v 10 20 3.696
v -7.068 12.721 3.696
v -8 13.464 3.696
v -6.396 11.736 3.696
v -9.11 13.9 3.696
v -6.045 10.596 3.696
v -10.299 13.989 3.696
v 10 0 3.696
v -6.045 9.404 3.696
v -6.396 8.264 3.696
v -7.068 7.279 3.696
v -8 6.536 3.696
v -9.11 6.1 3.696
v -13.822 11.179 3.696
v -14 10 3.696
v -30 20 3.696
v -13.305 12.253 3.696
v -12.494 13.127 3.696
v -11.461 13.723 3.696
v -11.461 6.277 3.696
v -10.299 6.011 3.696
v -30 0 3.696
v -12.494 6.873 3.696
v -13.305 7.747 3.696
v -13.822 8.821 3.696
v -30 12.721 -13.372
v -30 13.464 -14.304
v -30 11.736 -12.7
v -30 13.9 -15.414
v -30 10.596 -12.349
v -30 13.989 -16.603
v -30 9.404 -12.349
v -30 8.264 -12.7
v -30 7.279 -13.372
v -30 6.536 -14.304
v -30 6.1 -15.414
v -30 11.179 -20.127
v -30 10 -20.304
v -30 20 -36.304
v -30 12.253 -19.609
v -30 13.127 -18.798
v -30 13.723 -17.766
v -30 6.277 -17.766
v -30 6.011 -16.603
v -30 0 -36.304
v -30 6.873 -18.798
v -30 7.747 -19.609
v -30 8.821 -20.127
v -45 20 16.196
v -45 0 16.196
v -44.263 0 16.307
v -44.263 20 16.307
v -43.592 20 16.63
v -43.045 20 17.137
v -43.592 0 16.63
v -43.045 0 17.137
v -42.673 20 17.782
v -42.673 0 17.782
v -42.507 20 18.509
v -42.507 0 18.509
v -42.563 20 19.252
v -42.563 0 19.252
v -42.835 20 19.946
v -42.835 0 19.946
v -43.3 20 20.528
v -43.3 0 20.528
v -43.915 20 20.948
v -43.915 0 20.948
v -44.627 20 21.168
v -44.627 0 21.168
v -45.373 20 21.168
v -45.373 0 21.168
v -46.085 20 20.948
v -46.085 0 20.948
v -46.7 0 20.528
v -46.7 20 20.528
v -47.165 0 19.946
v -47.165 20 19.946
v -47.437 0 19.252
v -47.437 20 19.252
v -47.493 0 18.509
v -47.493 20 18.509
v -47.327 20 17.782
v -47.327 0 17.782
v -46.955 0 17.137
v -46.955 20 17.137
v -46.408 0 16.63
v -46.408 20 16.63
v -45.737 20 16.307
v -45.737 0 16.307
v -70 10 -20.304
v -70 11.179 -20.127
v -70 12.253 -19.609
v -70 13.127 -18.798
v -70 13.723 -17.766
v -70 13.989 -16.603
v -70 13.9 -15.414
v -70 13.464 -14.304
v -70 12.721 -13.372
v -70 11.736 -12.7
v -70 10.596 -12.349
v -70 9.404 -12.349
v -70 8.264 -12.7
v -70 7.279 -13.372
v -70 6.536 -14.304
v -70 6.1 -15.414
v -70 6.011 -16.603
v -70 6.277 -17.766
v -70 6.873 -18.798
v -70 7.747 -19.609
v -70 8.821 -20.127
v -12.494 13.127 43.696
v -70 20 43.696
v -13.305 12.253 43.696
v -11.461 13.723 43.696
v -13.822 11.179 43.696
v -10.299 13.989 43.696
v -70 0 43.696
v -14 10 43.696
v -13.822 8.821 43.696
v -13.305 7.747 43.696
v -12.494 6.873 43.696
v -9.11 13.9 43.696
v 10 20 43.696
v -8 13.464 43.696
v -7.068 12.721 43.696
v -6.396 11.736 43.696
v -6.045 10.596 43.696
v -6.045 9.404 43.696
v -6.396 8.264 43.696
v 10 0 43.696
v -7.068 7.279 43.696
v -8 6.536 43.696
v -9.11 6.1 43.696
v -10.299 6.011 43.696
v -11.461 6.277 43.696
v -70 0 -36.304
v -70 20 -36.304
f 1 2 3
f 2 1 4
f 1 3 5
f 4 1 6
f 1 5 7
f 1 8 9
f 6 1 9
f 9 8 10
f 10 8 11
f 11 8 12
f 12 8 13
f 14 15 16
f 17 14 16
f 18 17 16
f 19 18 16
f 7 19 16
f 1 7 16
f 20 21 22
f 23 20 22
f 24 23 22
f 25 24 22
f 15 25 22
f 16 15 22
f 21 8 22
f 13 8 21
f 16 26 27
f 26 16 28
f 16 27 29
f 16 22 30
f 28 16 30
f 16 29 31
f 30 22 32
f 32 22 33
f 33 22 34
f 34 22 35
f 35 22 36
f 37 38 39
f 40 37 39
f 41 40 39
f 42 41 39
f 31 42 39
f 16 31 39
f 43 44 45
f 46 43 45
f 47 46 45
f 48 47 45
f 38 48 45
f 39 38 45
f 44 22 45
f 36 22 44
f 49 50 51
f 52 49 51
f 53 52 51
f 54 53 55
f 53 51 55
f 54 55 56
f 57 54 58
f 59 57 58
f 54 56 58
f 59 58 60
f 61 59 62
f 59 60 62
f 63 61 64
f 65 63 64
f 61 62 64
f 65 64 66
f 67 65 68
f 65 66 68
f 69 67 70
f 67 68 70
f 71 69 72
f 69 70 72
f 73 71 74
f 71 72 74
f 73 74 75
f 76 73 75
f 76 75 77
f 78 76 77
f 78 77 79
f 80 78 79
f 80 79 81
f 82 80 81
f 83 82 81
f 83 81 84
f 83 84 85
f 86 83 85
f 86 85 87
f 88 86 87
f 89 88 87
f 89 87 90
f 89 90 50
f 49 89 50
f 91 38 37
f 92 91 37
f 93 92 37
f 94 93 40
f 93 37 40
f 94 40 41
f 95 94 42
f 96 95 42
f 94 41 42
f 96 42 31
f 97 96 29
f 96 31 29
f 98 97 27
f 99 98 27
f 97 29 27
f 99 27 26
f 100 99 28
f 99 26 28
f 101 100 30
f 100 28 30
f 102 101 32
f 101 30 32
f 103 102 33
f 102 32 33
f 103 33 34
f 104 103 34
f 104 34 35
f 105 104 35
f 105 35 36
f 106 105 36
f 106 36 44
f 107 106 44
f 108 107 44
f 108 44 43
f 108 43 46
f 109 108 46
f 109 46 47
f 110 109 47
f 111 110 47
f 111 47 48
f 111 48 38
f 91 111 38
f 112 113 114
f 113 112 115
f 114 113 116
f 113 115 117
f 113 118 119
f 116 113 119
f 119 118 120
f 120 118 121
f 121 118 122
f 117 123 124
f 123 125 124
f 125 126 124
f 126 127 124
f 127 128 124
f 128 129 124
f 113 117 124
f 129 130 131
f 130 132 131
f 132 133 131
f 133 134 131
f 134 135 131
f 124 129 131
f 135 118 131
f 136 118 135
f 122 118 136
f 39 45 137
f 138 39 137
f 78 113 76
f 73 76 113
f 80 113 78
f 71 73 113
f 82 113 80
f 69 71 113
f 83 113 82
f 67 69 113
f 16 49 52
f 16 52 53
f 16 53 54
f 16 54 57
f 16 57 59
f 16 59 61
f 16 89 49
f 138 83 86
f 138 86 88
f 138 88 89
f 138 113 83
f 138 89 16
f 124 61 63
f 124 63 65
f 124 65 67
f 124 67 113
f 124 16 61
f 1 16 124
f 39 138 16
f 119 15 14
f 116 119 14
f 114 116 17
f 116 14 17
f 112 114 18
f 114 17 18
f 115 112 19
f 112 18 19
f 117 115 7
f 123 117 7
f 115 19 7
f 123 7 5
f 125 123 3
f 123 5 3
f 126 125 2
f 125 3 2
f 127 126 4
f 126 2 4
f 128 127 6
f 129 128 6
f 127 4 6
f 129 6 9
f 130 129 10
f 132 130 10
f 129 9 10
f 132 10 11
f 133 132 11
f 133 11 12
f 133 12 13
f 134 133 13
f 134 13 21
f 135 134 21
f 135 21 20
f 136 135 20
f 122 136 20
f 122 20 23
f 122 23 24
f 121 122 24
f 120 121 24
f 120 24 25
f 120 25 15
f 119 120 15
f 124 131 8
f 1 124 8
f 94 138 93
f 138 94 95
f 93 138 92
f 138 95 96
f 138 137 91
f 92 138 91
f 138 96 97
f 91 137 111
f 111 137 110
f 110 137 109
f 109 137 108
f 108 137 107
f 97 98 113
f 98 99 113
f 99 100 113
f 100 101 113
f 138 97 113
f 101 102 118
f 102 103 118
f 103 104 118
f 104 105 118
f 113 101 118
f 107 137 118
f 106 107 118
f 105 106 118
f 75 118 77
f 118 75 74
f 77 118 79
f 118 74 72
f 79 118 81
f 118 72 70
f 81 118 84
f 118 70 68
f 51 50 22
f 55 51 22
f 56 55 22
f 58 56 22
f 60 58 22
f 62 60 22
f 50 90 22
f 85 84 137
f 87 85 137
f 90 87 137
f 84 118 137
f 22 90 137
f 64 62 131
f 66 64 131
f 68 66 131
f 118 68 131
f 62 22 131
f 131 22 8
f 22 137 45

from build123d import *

# Parameters (mm, degrees)
RESSALTO_EXTRUS_O1_DEPTH = 20
ESBO_O3_R                = 4
CORTE_EXTRUS_O1_DEPTH    = 63.524475359
ESBO_O4_R                = 4
CORTE_EXTRUS_O2_DEPTH    = 84.066238629
ESBO_O5_R                = 2.5
CORTE_EXTRUS_O3_DEPTH    = 85.907655832


with BuildPart() as part:
    # Esboço1 → Ressalto-extrusão1 (new body)
    with BuildSketch(Plane(origin=(0, 0, 0), x_dir=(1, 0, 0), z_dir=(0, 1, 0))):
        Polygon((-70, 36.304347826), (-70, -43.695652174), (10, -43.695652174), (10, -3.695652174), (-30, -3.695652174), (-30, 36.304347826), align=None)
    extrude(amount=RESSALTO_EXTRUS_O1_DEPTH)

    # Esboço3 → Corte-extrusão1 (cut, through all)
    with BuildSketch(Plane(origin=(-30, 0, 0), x_dir=(0, 0, -1), z_dir=(1, 0, 0))):
        with Locations((16.304347826, 10)):
            Circle(ESBO_O3_R)
    extrude(amount=-CORTE_EXTRUS_O1_DEPTH, mode=Mode.SUBTRACT)

    # Esboço4 → Corte-extrusão2 (cut, through all)
    with BuildSketch(Plane(origin=(0, 0, 3.695652174), x_dir=(-1, 0, 0), z_dir=(0, 0, -1))):
        with Locations((10, 10)):
            Circle(ESBO_O4_R)
    extrude(amount=-CORTE_EXTRUS_O2_DEPTH, mode=Mode.SUBTRACT)

    # Esboço5 → Corte-extrusão3 (cut, through all)
    with BuildSketch(Plane.XZ):
        with Locations(Location((-45, 18.695652174, 0), (0, 0, 270))):
            Circle(ESBO_O5_R)
    extrude(amount=-CORTE_EXTRUS_O3_DEPTH, mode=Mode.SUBTRACT)


solid = part.part
